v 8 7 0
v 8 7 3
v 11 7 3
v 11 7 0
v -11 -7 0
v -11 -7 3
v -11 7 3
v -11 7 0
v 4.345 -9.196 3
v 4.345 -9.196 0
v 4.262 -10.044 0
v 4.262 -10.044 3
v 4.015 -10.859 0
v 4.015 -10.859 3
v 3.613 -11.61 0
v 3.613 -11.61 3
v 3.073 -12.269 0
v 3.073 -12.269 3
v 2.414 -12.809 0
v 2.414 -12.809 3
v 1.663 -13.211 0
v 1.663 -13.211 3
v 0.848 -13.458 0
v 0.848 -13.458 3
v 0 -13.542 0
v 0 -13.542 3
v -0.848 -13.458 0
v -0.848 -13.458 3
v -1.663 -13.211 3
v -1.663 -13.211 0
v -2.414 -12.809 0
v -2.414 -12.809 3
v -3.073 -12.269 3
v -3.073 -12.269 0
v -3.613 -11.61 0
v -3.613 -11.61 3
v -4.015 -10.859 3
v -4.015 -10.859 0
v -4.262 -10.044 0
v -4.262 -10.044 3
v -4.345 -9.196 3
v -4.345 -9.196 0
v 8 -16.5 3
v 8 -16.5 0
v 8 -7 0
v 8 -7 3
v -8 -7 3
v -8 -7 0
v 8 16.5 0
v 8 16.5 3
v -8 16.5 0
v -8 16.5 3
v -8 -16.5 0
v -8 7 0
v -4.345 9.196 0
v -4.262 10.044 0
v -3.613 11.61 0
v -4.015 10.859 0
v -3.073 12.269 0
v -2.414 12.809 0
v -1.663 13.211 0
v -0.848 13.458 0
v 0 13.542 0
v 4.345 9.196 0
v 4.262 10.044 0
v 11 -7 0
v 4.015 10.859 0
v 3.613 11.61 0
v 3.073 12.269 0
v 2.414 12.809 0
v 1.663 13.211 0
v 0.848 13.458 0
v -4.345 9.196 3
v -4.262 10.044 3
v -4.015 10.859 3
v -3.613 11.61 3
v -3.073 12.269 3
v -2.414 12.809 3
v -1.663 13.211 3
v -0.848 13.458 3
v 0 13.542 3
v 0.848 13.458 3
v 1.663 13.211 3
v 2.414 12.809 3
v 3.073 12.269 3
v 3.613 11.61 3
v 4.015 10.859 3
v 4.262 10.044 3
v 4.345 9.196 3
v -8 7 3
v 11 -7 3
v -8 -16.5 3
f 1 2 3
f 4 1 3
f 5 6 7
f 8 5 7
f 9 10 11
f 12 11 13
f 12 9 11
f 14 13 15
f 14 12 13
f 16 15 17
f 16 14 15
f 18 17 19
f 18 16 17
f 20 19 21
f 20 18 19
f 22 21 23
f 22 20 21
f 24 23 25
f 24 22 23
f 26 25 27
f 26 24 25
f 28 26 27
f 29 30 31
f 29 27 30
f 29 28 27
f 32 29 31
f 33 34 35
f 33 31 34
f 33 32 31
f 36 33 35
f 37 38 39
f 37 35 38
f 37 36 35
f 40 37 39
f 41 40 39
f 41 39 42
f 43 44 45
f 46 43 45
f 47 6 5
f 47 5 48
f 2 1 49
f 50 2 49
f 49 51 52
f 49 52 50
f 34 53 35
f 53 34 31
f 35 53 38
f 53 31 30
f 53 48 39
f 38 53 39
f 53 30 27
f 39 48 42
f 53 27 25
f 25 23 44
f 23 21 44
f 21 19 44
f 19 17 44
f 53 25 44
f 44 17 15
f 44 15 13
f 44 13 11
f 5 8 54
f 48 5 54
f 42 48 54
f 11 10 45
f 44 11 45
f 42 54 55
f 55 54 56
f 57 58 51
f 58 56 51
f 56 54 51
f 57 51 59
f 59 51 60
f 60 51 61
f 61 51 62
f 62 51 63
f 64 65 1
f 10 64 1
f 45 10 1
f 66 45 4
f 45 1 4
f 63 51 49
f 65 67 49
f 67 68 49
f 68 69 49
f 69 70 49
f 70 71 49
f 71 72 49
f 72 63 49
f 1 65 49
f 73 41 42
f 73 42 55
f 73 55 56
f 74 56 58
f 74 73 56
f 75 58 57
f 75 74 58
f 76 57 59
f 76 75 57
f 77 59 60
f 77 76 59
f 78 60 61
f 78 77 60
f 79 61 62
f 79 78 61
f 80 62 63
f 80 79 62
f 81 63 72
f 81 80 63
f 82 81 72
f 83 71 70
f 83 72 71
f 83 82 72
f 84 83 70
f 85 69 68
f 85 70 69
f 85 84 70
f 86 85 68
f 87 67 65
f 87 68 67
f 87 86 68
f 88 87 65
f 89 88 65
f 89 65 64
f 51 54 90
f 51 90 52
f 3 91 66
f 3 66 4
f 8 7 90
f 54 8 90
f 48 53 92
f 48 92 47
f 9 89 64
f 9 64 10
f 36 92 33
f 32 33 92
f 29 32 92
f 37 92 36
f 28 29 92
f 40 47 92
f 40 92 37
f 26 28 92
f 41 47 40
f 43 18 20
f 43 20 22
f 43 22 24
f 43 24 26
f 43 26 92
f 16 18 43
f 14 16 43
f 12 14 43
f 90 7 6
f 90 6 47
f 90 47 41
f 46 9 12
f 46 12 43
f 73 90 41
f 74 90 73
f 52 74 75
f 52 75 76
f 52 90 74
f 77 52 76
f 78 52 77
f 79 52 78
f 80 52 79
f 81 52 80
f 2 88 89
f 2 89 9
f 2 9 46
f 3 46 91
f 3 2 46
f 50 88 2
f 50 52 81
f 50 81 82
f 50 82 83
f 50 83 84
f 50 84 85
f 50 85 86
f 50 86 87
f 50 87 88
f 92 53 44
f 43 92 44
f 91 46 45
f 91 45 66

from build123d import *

# Parameters (mm, degrees)
SKETCH1_W           = 16
SKETCH1_H           = 33
BOSS_EXTRUDE1_DEPTH = 3
SKETCH2_W           = 22
SKETCH2_H           = 14
BOSS_EXTRUDE2_DEPTH = 3
CUT_EXTRUDE1_DEPTH  = 10


with BuildPart() as part:
    # Sketch1 → Boss-Extrude1 (new body)
    with BuildSketch(Plane.XY):
        Rectangle(SKETCH1_W, SKETCH1_H)
    extrude(amount=BOSS_EXTRUDE1_DEPTH)

    # Sketch2 → Boss-Extrude2 (add)
    with BuildSketch(Plane.XY.offset(3)):
        Rectangle(SKETCH2_W, SKETCH2_H)
    extrude(amount=-BOSS_EXTRUDE2_DEPTH)

    # Sketch3 → Cut-Extrude1 (cut)
    with BuildSketch(Plane.XY.offset(3)):
        with BuildLine():
            Line((4.345494921, 9.196065885), (4.345494921, -9.196065885))
            ThreePointArc((4.345494921, -9.196065885), (0, -13.541560806), (-4.345494921, -9.196065885))
            Line((-4.345494921, -9.196065885), (-4.345494921, 9.196065885))
            ThreePointArc((-4.345494921, 9.196065885), (0, 13.541560806), (4.345494921, 9.196065885))
        make_face()
    extrude(amount=-CUT_EXTRUDE1_DEPTH, mode=Mode.SUBTRACT)


solid = part.part
